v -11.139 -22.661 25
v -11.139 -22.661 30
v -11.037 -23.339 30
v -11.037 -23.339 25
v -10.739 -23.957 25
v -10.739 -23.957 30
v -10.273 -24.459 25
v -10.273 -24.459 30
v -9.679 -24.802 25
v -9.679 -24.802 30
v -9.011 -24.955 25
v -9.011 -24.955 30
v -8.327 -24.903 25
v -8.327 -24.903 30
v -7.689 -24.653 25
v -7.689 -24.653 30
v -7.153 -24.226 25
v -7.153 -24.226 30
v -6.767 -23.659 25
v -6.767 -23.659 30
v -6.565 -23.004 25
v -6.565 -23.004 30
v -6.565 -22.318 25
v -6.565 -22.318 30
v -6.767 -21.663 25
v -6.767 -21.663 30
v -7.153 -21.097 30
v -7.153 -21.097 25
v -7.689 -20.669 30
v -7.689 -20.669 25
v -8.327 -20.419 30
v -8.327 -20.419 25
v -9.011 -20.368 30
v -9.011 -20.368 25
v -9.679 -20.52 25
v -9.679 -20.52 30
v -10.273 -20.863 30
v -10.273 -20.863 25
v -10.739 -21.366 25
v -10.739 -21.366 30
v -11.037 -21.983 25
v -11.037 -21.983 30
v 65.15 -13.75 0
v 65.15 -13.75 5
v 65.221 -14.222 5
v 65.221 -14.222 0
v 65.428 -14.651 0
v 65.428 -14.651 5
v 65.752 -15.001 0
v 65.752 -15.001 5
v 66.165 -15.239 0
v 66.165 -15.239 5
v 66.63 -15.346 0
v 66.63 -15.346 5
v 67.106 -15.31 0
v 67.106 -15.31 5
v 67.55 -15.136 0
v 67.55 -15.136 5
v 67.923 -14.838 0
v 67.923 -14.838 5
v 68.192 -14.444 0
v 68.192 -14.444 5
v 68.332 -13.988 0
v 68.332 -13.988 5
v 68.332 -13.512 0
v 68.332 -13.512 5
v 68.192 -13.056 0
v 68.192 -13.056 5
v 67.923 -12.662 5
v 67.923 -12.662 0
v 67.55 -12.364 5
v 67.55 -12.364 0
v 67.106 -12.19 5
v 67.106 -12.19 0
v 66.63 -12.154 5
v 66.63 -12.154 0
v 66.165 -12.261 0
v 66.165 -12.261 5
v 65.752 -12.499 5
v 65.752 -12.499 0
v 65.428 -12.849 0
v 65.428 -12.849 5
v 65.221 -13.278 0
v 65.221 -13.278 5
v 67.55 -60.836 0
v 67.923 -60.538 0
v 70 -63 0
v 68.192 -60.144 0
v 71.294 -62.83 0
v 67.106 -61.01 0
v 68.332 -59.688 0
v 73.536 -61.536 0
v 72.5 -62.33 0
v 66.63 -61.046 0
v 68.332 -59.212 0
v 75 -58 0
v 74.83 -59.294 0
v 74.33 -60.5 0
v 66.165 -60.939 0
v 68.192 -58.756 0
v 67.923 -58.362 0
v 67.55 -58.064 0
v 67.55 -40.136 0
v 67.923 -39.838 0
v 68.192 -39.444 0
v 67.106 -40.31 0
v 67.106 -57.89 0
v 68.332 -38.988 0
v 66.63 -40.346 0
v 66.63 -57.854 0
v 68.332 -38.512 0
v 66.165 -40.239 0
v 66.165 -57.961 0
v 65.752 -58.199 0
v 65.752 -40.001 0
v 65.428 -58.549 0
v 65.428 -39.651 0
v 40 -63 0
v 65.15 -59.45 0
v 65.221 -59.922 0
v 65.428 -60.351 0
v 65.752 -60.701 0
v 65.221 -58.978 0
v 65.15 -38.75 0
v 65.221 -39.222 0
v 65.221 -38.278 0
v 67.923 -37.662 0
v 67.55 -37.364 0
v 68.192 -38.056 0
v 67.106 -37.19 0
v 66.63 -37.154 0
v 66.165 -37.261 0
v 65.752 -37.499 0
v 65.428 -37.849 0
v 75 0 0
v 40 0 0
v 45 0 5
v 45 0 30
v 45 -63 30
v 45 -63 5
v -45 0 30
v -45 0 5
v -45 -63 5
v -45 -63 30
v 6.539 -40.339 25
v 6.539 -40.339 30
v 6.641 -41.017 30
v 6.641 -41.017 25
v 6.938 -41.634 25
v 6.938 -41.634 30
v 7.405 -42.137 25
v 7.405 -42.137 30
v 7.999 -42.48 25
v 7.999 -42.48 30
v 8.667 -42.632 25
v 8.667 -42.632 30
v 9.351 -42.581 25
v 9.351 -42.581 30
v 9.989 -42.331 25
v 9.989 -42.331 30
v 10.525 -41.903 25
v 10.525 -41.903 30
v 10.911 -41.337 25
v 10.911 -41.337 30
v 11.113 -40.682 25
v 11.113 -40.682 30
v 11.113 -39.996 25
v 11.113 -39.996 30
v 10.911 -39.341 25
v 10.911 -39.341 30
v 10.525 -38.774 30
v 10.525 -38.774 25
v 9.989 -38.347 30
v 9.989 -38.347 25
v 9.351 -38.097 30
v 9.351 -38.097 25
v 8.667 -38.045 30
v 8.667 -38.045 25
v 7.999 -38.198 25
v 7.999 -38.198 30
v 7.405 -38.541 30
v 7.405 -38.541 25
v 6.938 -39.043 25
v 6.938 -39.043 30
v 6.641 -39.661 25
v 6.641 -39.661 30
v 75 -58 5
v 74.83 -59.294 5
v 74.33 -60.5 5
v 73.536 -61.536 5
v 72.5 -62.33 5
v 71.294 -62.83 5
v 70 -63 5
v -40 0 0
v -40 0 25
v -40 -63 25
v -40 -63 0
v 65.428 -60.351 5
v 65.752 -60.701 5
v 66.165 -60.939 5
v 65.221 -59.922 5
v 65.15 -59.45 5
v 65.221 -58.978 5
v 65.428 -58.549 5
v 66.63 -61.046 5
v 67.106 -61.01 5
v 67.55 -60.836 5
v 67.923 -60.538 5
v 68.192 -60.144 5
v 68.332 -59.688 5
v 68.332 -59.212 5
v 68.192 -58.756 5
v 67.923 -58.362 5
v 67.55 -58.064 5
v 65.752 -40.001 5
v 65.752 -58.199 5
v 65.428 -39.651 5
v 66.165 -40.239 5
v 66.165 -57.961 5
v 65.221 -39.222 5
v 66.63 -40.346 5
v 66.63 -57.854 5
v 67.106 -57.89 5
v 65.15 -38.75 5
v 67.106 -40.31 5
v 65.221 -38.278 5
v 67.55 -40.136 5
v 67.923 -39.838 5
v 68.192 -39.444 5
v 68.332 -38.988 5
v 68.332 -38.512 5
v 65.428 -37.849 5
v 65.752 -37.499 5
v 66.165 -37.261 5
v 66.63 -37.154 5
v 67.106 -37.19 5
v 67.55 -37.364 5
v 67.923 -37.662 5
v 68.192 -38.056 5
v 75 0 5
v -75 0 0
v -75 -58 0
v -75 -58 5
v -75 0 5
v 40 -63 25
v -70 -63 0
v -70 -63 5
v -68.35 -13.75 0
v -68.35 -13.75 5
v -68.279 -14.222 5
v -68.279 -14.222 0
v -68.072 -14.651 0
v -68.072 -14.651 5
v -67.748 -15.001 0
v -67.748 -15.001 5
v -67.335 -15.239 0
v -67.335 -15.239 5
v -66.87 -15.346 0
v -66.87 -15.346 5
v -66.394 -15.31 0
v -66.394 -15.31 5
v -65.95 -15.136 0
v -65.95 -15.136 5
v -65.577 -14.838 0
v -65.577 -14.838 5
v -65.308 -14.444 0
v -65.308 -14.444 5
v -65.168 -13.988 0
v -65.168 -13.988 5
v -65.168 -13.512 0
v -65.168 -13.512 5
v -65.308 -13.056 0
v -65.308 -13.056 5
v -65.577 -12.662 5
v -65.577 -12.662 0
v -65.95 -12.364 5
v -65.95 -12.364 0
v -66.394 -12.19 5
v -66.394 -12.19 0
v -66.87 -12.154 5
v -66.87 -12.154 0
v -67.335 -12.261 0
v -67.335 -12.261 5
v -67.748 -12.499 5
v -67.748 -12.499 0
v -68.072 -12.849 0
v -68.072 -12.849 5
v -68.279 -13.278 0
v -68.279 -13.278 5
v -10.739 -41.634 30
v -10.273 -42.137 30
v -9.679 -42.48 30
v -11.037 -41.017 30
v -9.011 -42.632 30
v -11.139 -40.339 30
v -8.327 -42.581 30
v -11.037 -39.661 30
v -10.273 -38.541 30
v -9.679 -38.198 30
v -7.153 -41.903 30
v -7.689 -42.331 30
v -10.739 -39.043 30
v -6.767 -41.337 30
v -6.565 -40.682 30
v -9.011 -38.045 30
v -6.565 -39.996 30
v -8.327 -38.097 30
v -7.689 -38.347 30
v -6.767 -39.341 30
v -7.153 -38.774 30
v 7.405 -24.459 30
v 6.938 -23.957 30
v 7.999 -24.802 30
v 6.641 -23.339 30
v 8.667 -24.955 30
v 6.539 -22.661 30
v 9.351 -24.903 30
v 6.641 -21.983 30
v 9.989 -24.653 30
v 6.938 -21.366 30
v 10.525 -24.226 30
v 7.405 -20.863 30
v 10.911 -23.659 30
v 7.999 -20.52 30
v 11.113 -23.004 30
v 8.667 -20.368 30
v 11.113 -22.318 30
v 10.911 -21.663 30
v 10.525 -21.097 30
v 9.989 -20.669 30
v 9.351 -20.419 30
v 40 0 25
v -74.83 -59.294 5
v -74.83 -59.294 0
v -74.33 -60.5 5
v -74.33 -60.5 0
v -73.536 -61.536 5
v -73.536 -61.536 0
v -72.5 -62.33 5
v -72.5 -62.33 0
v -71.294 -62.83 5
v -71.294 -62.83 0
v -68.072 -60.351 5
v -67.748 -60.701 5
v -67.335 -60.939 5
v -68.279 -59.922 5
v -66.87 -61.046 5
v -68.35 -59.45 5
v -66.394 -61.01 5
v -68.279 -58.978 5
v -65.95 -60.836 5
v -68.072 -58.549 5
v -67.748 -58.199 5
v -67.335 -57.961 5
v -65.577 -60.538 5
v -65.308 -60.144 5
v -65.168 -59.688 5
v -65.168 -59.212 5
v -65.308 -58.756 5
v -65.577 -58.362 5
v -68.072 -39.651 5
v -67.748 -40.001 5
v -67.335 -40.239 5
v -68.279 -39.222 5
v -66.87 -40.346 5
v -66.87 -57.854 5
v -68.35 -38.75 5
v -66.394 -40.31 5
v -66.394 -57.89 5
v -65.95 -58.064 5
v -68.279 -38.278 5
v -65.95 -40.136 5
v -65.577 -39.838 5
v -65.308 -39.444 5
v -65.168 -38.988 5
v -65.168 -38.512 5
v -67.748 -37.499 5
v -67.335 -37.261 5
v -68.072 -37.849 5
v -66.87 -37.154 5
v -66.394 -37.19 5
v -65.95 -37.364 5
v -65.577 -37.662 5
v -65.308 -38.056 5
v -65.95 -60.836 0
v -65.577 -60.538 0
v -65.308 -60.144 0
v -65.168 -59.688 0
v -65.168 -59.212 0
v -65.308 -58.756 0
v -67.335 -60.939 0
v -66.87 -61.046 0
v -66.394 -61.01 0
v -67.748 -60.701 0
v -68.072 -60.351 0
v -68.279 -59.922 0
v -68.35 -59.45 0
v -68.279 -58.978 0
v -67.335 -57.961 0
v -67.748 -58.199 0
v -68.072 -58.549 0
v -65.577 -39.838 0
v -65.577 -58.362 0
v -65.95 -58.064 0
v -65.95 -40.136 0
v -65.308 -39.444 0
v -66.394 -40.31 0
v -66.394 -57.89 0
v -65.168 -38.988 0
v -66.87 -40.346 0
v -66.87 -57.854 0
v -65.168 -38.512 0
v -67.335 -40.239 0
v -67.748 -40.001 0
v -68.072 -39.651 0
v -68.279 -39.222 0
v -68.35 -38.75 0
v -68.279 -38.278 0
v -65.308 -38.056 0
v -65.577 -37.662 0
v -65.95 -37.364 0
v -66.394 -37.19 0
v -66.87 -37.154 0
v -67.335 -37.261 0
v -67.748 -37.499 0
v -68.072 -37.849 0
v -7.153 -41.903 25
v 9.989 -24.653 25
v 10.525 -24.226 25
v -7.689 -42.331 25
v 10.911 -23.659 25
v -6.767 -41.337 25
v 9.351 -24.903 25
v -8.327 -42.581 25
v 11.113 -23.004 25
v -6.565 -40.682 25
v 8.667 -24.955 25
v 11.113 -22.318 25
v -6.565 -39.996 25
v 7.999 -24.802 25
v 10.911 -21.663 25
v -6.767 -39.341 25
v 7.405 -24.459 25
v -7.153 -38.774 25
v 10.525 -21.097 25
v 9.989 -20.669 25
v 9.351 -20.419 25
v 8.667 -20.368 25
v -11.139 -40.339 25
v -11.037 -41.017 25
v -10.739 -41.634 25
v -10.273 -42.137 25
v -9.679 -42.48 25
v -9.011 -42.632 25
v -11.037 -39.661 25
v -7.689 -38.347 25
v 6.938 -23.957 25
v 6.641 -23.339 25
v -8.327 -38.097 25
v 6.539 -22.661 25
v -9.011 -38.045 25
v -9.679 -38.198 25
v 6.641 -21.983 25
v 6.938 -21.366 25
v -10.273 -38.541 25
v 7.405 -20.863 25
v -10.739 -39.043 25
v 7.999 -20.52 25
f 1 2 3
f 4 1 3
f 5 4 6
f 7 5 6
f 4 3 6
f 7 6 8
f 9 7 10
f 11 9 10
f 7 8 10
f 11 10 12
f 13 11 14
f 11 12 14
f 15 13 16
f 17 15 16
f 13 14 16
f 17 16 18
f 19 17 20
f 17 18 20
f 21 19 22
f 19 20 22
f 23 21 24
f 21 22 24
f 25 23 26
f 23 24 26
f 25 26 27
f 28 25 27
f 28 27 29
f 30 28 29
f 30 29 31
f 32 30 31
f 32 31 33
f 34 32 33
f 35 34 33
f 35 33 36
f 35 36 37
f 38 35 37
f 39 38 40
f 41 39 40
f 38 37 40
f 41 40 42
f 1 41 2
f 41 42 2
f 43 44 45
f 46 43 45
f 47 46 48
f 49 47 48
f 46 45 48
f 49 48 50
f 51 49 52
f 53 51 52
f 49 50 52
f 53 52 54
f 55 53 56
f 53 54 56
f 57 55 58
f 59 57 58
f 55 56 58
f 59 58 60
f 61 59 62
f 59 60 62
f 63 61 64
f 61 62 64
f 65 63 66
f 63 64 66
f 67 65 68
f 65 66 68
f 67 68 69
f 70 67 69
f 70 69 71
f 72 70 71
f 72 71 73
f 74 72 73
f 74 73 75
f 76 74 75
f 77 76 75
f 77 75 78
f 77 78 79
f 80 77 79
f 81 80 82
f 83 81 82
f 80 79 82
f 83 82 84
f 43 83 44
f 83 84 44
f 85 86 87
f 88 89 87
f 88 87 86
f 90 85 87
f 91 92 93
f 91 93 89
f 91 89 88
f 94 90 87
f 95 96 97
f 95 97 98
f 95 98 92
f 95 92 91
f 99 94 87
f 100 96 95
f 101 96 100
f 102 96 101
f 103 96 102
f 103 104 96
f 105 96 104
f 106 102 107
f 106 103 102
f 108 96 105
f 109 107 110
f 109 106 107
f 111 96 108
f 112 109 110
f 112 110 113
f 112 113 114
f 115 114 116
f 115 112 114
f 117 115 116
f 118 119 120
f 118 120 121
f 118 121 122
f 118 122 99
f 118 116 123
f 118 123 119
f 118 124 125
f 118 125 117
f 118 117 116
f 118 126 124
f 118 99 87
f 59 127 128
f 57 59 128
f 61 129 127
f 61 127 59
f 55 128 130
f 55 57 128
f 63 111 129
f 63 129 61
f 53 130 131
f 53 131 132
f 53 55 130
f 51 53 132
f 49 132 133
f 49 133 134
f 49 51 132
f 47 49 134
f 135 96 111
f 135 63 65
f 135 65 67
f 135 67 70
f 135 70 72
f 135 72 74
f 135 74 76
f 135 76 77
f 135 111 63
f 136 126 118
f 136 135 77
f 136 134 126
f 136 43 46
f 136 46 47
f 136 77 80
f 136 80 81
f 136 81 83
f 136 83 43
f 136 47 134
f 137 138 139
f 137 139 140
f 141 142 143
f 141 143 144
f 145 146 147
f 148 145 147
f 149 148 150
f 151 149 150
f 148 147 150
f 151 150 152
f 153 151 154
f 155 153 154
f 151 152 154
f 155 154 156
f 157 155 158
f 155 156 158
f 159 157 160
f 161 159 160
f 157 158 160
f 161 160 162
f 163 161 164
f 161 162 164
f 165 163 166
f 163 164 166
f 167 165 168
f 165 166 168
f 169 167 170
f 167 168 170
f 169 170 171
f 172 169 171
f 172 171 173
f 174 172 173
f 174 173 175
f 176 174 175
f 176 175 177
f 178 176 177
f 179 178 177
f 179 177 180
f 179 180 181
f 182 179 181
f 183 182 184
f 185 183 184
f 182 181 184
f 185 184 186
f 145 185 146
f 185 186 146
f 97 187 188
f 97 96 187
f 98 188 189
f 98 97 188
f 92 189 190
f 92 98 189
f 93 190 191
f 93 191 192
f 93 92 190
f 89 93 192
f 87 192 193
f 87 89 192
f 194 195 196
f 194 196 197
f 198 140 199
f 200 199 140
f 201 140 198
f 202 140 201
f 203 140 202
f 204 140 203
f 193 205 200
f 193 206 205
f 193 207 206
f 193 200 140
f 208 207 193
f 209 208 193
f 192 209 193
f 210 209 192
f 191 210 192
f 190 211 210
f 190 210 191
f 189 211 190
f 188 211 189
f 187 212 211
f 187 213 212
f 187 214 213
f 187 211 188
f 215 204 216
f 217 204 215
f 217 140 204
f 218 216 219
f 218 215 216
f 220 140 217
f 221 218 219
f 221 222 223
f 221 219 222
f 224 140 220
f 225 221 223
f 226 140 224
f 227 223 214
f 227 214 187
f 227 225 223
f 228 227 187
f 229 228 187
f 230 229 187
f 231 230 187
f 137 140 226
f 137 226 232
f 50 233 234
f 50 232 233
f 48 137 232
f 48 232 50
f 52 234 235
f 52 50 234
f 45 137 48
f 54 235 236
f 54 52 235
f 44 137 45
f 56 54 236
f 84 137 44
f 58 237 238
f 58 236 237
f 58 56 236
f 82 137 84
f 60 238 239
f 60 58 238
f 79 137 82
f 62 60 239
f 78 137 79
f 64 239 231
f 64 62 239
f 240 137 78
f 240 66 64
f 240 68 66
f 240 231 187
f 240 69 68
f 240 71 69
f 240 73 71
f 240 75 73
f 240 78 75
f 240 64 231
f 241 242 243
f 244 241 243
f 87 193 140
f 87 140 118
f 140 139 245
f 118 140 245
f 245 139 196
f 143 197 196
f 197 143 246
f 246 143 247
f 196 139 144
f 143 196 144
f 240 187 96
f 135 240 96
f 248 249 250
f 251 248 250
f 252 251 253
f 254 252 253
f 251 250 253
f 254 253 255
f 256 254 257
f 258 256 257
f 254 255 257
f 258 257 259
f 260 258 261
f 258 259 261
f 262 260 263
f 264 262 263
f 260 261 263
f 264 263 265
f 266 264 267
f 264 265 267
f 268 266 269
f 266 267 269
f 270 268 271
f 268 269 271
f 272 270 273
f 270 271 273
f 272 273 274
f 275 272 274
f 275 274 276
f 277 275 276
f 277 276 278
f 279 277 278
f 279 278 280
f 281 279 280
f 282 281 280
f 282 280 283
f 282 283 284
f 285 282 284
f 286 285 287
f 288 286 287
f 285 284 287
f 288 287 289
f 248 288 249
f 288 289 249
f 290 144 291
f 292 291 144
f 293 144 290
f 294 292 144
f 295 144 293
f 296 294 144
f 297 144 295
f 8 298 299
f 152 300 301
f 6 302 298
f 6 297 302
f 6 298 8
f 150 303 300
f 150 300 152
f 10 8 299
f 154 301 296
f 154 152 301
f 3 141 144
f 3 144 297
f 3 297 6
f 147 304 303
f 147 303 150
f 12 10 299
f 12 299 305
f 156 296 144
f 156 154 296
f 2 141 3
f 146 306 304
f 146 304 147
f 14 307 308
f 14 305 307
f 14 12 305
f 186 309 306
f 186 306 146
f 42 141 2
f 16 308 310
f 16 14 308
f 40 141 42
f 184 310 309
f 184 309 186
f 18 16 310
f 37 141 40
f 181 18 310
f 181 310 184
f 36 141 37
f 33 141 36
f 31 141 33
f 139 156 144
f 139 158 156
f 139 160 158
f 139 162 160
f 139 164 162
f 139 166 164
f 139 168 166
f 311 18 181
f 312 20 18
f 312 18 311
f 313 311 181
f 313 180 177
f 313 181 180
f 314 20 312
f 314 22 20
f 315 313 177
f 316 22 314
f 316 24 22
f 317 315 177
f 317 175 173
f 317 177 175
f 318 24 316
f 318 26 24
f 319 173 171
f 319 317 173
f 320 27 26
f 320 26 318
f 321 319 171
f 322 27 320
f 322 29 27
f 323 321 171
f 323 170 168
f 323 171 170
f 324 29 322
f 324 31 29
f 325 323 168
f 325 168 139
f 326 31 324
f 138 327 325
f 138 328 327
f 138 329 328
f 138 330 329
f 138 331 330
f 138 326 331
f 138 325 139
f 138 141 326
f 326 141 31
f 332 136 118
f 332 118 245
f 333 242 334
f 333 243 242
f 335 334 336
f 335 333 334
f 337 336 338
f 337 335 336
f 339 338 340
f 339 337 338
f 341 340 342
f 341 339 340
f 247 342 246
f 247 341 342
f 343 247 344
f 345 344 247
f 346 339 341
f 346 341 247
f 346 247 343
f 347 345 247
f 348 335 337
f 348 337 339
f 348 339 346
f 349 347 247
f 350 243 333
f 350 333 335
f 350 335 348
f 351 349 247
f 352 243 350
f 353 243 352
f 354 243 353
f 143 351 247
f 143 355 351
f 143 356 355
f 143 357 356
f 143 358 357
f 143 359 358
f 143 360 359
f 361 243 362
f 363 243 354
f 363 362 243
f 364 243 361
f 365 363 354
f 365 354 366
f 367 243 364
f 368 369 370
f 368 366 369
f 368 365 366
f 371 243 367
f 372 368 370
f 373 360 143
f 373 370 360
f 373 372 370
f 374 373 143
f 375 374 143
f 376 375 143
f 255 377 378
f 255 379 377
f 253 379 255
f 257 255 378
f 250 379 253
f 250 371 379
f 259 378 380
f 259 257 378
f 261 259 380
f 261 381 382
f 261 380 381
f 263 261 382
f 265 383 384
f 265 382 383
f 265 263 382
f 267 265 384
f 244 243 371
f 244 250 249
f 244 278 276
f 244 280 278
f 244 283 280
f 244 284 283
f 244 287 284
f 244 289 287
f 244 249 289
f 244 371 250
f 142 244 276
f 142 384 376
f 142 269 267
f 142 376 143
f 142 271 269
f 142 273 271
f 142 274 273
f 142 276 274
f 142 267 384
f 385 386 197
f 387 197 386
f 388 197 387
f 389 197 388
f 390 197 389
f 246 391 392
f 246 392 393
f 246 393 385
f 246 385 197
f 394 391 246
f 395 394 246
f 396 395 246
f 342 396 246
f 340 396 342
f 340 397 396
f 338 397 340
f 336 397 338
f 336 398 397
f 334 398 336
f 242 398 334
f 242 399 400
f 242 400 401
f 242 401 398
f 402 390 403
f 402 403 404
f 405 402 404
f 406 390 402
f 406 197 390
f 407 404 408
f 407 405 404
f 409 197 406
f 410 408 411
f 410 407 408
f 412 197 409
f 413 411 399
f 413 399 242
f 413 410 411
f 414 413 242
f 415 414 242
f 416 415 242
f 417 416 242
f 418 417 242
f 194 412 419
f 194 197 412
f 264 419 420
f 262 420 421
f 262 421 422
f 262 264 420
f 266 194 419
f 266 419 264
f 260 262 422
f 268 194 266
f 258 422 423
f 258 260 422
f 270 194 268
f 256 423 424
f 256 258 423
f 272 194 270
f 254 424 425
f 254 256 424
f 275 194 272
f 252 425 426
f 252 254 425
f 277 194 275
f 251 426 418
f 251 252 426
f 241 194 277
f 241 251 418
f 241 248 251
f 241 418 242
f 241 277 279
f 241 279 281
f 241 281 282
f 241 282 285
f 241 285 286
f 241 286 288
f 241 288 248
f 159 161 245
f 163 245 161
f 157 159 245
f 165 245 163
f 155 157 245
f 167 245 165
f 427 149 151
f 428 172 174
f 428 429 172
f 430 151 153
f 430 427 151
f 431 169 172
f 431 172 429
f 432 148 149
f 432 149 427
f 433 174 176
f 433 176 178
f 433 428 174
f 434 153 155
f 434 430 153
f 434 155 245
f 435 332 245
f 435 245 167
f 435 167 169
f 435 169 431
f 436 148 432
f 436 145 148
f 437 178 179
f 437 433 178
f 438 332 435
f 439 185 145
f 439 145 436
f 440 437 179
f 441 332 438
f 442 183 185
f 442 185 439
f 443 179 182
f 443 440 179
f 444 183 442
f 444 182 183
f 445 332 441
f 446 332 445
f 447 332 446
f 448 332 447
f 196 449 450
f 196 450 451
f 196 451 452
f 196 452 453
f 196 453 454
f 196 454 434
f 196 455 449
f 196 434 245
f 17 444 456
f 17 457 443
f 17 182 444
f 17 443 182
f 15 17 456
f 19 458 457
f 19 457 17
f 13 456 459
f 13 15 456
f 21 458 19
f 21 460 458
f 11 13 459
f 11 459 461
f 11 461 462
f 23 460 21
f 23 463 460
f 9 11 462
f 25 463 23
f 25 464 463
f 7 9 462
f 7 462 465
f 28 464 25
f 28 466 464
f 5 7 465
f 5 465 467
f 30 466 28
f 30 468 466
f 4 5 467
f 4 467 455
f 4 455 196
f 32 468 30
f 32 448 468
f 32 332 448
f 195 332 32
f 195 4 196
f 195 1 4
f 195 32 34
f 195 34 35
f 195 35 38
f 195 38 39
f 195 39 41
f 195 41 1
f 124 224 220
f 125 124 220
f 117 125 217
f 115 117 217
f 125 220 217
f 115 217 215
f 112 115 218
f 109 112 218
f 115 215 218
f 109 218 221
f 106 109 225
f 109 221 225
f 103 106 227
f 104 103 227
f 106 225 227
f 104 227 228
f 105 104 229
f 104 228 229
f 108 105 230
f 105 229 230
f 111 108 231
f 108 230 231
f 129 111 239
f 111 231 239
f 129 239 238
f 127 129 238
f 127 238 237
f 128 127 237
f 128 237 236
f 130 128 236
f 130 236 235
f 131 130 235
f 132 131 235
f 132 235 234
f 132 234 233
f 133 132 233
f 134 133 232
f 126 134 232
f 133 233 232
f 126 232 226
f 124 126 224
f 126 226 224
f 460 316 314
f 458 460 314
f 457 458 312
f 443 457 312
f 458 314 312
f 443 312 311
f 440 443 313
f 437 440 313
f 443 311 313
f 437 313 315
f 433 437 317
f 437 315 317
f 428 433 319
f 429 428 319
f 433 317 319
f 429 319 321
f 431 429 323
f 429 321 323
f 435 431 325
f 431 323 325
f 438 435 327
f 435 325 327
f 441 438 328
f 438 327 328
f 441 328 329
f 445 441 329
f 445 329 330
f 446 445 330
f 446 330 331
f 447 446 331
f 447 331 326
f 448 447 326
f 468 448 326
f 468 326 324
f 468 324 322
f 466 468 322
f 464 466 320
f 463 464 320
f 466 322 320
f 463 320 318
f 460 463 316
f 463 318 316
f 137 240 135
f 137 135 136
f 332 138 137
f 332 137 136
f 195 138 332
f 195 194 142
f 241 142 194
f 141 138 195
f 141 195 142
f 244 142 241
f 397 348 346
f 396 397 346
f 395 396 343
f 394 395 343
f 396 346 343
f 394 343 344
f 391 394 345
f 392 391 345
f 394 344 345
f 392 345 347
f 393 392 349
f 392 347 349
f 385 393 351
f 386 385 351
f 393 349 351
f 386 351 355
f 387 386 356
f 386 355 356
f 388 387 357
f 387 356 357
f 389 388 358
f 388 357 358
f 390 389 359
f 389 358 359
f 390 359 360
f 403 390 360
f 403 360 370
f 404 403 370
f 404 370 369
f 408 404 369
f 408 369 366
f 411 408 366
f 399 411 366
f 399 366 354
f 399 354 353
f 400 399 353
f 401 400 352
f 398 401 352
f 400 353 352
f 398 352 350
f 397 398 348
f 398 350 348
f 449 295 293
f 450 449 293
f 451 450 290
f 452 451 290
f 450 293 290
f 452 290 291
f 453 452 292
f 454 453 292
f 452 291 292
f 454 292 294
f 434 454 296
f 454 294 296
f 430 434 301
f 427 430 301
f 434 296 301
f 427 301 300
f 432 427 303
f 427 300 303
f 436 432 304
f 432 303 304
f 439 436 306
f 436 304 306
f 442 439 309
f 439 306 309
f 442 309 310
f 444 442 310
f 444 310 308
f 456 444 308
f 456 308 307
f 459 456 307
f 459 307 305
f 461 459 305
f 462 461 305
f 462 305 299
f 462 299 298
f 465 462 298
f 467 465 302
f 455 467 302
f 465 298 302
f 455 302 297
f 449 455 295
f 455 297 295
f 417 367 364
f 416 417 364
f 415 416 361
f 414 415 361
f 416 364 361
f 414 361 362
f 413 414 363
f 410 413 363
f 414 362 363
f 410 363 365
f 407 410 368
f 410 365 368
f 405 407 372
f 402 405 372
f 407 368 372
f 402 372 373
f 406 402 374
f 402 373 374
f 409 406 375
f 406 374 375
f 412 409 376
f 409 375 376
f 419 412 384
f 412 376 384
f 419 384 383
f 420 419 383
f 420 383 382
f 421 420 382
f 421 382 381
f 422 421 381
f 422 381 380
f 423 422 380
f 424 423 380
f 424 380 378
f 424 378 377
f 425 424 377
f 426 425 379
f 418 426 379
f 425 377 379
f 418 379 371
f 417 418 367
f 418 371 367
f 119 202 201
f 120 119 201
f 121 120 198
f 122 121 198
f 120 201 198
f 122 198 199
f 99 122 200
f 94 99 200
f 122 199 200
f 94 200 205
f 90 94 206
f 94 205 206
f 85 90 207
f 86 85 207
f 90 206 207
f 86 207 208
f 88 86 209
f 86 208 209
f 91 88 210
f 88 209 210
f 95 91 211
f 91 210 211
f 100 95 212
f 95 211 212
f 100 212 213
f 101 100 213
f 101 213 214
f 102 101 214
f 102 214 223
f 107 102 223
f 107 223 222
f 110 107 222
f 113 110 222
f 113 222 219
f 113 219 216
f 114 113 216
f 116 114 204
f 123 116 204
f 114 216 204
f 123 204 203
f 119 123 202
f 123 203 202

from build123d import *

# Parameters (mm, degrees)
PAD008_DEPTH    = 63
FILLET003_R     = 5
SKETCH052_R     = 1.6
POCKET033_DEPTH = 5
SKETCH053_R     = 2.3
POCKET034_DEPTH = 5


with BuildPart() as part:
    # Sketch051 → Pad008 (new body)
    with BuildSketch(Plane.XZ):
        Polygon((-75, 0), (-75, 5), (-45, 5), (-45, 30), (45, 30), (45, 5), (75, 5), (75, 0), (40, 0), (40, 25), (-40, 25), (-40, 0), align=None)
    extrude(amount=PAD008_DEPTH)

    # Fillet003
    fillet003_edges = [part.edges().sort_by_distance(p)[0] for p in [
        (75, -63, 2.5),
        (-75, -63, 2.5),
    ]]
    fillet(fillet003_edges, radius=FILLET003_R)

    # Sketch052 (on Face11 of Fillet003) → Pocket033 (cut)
    with BuildSketch(Plane(origin=(0, 0, 5), x_dir=(-1, 0, 0), z_dir=(0, 0, 1))):
        with Locations((-66.75, 13.75)):
            Circle(SKETCH052_R)
        with Locations((-66.75, 38.75)):
            Circle(SKETCH052_R)
        with Locations((-66.75, 59.45)):
            Circle(SKETCH052_R)
        with Locations((66.75, 59.45)):
            Circle(SKETCH052_R)
        with Locations((66.75, 38.75)):
            Circle(SKETCH052_R)
        with Locations((66.75, 13.75)):
            Circle(SKETCH052_R)
    extrude(amount=-POCKET033_DEPTH, mode=Mode.SUBTRACT)

    # Sketch053 (on Face12 of Pocket033) → Pocket034 (cut)
    with BuildSketch(Plane(origin=(0, 0, 30), x_dir=(-1, 0, 0), z_dir=(0, 0, 1))):
        with Locations((8.8388347648, 40.3388347648)):
            Circle(SKETCH053_R)
        with Locations((8.8388347648, 22.6611652352)):
            Circle(SKETCH053_R)
        with Locations((-8.8388347648, 22.6611652352)):
            Circle(SKETCH053_R)
        with Locations((-8.8388347648, 40.3388347648)):
            Circle(SKETCH053_R)
    extrude(amount=-POCKET034_DEPTH, mode=Mode.SUBTRACT)


solid = part.part
